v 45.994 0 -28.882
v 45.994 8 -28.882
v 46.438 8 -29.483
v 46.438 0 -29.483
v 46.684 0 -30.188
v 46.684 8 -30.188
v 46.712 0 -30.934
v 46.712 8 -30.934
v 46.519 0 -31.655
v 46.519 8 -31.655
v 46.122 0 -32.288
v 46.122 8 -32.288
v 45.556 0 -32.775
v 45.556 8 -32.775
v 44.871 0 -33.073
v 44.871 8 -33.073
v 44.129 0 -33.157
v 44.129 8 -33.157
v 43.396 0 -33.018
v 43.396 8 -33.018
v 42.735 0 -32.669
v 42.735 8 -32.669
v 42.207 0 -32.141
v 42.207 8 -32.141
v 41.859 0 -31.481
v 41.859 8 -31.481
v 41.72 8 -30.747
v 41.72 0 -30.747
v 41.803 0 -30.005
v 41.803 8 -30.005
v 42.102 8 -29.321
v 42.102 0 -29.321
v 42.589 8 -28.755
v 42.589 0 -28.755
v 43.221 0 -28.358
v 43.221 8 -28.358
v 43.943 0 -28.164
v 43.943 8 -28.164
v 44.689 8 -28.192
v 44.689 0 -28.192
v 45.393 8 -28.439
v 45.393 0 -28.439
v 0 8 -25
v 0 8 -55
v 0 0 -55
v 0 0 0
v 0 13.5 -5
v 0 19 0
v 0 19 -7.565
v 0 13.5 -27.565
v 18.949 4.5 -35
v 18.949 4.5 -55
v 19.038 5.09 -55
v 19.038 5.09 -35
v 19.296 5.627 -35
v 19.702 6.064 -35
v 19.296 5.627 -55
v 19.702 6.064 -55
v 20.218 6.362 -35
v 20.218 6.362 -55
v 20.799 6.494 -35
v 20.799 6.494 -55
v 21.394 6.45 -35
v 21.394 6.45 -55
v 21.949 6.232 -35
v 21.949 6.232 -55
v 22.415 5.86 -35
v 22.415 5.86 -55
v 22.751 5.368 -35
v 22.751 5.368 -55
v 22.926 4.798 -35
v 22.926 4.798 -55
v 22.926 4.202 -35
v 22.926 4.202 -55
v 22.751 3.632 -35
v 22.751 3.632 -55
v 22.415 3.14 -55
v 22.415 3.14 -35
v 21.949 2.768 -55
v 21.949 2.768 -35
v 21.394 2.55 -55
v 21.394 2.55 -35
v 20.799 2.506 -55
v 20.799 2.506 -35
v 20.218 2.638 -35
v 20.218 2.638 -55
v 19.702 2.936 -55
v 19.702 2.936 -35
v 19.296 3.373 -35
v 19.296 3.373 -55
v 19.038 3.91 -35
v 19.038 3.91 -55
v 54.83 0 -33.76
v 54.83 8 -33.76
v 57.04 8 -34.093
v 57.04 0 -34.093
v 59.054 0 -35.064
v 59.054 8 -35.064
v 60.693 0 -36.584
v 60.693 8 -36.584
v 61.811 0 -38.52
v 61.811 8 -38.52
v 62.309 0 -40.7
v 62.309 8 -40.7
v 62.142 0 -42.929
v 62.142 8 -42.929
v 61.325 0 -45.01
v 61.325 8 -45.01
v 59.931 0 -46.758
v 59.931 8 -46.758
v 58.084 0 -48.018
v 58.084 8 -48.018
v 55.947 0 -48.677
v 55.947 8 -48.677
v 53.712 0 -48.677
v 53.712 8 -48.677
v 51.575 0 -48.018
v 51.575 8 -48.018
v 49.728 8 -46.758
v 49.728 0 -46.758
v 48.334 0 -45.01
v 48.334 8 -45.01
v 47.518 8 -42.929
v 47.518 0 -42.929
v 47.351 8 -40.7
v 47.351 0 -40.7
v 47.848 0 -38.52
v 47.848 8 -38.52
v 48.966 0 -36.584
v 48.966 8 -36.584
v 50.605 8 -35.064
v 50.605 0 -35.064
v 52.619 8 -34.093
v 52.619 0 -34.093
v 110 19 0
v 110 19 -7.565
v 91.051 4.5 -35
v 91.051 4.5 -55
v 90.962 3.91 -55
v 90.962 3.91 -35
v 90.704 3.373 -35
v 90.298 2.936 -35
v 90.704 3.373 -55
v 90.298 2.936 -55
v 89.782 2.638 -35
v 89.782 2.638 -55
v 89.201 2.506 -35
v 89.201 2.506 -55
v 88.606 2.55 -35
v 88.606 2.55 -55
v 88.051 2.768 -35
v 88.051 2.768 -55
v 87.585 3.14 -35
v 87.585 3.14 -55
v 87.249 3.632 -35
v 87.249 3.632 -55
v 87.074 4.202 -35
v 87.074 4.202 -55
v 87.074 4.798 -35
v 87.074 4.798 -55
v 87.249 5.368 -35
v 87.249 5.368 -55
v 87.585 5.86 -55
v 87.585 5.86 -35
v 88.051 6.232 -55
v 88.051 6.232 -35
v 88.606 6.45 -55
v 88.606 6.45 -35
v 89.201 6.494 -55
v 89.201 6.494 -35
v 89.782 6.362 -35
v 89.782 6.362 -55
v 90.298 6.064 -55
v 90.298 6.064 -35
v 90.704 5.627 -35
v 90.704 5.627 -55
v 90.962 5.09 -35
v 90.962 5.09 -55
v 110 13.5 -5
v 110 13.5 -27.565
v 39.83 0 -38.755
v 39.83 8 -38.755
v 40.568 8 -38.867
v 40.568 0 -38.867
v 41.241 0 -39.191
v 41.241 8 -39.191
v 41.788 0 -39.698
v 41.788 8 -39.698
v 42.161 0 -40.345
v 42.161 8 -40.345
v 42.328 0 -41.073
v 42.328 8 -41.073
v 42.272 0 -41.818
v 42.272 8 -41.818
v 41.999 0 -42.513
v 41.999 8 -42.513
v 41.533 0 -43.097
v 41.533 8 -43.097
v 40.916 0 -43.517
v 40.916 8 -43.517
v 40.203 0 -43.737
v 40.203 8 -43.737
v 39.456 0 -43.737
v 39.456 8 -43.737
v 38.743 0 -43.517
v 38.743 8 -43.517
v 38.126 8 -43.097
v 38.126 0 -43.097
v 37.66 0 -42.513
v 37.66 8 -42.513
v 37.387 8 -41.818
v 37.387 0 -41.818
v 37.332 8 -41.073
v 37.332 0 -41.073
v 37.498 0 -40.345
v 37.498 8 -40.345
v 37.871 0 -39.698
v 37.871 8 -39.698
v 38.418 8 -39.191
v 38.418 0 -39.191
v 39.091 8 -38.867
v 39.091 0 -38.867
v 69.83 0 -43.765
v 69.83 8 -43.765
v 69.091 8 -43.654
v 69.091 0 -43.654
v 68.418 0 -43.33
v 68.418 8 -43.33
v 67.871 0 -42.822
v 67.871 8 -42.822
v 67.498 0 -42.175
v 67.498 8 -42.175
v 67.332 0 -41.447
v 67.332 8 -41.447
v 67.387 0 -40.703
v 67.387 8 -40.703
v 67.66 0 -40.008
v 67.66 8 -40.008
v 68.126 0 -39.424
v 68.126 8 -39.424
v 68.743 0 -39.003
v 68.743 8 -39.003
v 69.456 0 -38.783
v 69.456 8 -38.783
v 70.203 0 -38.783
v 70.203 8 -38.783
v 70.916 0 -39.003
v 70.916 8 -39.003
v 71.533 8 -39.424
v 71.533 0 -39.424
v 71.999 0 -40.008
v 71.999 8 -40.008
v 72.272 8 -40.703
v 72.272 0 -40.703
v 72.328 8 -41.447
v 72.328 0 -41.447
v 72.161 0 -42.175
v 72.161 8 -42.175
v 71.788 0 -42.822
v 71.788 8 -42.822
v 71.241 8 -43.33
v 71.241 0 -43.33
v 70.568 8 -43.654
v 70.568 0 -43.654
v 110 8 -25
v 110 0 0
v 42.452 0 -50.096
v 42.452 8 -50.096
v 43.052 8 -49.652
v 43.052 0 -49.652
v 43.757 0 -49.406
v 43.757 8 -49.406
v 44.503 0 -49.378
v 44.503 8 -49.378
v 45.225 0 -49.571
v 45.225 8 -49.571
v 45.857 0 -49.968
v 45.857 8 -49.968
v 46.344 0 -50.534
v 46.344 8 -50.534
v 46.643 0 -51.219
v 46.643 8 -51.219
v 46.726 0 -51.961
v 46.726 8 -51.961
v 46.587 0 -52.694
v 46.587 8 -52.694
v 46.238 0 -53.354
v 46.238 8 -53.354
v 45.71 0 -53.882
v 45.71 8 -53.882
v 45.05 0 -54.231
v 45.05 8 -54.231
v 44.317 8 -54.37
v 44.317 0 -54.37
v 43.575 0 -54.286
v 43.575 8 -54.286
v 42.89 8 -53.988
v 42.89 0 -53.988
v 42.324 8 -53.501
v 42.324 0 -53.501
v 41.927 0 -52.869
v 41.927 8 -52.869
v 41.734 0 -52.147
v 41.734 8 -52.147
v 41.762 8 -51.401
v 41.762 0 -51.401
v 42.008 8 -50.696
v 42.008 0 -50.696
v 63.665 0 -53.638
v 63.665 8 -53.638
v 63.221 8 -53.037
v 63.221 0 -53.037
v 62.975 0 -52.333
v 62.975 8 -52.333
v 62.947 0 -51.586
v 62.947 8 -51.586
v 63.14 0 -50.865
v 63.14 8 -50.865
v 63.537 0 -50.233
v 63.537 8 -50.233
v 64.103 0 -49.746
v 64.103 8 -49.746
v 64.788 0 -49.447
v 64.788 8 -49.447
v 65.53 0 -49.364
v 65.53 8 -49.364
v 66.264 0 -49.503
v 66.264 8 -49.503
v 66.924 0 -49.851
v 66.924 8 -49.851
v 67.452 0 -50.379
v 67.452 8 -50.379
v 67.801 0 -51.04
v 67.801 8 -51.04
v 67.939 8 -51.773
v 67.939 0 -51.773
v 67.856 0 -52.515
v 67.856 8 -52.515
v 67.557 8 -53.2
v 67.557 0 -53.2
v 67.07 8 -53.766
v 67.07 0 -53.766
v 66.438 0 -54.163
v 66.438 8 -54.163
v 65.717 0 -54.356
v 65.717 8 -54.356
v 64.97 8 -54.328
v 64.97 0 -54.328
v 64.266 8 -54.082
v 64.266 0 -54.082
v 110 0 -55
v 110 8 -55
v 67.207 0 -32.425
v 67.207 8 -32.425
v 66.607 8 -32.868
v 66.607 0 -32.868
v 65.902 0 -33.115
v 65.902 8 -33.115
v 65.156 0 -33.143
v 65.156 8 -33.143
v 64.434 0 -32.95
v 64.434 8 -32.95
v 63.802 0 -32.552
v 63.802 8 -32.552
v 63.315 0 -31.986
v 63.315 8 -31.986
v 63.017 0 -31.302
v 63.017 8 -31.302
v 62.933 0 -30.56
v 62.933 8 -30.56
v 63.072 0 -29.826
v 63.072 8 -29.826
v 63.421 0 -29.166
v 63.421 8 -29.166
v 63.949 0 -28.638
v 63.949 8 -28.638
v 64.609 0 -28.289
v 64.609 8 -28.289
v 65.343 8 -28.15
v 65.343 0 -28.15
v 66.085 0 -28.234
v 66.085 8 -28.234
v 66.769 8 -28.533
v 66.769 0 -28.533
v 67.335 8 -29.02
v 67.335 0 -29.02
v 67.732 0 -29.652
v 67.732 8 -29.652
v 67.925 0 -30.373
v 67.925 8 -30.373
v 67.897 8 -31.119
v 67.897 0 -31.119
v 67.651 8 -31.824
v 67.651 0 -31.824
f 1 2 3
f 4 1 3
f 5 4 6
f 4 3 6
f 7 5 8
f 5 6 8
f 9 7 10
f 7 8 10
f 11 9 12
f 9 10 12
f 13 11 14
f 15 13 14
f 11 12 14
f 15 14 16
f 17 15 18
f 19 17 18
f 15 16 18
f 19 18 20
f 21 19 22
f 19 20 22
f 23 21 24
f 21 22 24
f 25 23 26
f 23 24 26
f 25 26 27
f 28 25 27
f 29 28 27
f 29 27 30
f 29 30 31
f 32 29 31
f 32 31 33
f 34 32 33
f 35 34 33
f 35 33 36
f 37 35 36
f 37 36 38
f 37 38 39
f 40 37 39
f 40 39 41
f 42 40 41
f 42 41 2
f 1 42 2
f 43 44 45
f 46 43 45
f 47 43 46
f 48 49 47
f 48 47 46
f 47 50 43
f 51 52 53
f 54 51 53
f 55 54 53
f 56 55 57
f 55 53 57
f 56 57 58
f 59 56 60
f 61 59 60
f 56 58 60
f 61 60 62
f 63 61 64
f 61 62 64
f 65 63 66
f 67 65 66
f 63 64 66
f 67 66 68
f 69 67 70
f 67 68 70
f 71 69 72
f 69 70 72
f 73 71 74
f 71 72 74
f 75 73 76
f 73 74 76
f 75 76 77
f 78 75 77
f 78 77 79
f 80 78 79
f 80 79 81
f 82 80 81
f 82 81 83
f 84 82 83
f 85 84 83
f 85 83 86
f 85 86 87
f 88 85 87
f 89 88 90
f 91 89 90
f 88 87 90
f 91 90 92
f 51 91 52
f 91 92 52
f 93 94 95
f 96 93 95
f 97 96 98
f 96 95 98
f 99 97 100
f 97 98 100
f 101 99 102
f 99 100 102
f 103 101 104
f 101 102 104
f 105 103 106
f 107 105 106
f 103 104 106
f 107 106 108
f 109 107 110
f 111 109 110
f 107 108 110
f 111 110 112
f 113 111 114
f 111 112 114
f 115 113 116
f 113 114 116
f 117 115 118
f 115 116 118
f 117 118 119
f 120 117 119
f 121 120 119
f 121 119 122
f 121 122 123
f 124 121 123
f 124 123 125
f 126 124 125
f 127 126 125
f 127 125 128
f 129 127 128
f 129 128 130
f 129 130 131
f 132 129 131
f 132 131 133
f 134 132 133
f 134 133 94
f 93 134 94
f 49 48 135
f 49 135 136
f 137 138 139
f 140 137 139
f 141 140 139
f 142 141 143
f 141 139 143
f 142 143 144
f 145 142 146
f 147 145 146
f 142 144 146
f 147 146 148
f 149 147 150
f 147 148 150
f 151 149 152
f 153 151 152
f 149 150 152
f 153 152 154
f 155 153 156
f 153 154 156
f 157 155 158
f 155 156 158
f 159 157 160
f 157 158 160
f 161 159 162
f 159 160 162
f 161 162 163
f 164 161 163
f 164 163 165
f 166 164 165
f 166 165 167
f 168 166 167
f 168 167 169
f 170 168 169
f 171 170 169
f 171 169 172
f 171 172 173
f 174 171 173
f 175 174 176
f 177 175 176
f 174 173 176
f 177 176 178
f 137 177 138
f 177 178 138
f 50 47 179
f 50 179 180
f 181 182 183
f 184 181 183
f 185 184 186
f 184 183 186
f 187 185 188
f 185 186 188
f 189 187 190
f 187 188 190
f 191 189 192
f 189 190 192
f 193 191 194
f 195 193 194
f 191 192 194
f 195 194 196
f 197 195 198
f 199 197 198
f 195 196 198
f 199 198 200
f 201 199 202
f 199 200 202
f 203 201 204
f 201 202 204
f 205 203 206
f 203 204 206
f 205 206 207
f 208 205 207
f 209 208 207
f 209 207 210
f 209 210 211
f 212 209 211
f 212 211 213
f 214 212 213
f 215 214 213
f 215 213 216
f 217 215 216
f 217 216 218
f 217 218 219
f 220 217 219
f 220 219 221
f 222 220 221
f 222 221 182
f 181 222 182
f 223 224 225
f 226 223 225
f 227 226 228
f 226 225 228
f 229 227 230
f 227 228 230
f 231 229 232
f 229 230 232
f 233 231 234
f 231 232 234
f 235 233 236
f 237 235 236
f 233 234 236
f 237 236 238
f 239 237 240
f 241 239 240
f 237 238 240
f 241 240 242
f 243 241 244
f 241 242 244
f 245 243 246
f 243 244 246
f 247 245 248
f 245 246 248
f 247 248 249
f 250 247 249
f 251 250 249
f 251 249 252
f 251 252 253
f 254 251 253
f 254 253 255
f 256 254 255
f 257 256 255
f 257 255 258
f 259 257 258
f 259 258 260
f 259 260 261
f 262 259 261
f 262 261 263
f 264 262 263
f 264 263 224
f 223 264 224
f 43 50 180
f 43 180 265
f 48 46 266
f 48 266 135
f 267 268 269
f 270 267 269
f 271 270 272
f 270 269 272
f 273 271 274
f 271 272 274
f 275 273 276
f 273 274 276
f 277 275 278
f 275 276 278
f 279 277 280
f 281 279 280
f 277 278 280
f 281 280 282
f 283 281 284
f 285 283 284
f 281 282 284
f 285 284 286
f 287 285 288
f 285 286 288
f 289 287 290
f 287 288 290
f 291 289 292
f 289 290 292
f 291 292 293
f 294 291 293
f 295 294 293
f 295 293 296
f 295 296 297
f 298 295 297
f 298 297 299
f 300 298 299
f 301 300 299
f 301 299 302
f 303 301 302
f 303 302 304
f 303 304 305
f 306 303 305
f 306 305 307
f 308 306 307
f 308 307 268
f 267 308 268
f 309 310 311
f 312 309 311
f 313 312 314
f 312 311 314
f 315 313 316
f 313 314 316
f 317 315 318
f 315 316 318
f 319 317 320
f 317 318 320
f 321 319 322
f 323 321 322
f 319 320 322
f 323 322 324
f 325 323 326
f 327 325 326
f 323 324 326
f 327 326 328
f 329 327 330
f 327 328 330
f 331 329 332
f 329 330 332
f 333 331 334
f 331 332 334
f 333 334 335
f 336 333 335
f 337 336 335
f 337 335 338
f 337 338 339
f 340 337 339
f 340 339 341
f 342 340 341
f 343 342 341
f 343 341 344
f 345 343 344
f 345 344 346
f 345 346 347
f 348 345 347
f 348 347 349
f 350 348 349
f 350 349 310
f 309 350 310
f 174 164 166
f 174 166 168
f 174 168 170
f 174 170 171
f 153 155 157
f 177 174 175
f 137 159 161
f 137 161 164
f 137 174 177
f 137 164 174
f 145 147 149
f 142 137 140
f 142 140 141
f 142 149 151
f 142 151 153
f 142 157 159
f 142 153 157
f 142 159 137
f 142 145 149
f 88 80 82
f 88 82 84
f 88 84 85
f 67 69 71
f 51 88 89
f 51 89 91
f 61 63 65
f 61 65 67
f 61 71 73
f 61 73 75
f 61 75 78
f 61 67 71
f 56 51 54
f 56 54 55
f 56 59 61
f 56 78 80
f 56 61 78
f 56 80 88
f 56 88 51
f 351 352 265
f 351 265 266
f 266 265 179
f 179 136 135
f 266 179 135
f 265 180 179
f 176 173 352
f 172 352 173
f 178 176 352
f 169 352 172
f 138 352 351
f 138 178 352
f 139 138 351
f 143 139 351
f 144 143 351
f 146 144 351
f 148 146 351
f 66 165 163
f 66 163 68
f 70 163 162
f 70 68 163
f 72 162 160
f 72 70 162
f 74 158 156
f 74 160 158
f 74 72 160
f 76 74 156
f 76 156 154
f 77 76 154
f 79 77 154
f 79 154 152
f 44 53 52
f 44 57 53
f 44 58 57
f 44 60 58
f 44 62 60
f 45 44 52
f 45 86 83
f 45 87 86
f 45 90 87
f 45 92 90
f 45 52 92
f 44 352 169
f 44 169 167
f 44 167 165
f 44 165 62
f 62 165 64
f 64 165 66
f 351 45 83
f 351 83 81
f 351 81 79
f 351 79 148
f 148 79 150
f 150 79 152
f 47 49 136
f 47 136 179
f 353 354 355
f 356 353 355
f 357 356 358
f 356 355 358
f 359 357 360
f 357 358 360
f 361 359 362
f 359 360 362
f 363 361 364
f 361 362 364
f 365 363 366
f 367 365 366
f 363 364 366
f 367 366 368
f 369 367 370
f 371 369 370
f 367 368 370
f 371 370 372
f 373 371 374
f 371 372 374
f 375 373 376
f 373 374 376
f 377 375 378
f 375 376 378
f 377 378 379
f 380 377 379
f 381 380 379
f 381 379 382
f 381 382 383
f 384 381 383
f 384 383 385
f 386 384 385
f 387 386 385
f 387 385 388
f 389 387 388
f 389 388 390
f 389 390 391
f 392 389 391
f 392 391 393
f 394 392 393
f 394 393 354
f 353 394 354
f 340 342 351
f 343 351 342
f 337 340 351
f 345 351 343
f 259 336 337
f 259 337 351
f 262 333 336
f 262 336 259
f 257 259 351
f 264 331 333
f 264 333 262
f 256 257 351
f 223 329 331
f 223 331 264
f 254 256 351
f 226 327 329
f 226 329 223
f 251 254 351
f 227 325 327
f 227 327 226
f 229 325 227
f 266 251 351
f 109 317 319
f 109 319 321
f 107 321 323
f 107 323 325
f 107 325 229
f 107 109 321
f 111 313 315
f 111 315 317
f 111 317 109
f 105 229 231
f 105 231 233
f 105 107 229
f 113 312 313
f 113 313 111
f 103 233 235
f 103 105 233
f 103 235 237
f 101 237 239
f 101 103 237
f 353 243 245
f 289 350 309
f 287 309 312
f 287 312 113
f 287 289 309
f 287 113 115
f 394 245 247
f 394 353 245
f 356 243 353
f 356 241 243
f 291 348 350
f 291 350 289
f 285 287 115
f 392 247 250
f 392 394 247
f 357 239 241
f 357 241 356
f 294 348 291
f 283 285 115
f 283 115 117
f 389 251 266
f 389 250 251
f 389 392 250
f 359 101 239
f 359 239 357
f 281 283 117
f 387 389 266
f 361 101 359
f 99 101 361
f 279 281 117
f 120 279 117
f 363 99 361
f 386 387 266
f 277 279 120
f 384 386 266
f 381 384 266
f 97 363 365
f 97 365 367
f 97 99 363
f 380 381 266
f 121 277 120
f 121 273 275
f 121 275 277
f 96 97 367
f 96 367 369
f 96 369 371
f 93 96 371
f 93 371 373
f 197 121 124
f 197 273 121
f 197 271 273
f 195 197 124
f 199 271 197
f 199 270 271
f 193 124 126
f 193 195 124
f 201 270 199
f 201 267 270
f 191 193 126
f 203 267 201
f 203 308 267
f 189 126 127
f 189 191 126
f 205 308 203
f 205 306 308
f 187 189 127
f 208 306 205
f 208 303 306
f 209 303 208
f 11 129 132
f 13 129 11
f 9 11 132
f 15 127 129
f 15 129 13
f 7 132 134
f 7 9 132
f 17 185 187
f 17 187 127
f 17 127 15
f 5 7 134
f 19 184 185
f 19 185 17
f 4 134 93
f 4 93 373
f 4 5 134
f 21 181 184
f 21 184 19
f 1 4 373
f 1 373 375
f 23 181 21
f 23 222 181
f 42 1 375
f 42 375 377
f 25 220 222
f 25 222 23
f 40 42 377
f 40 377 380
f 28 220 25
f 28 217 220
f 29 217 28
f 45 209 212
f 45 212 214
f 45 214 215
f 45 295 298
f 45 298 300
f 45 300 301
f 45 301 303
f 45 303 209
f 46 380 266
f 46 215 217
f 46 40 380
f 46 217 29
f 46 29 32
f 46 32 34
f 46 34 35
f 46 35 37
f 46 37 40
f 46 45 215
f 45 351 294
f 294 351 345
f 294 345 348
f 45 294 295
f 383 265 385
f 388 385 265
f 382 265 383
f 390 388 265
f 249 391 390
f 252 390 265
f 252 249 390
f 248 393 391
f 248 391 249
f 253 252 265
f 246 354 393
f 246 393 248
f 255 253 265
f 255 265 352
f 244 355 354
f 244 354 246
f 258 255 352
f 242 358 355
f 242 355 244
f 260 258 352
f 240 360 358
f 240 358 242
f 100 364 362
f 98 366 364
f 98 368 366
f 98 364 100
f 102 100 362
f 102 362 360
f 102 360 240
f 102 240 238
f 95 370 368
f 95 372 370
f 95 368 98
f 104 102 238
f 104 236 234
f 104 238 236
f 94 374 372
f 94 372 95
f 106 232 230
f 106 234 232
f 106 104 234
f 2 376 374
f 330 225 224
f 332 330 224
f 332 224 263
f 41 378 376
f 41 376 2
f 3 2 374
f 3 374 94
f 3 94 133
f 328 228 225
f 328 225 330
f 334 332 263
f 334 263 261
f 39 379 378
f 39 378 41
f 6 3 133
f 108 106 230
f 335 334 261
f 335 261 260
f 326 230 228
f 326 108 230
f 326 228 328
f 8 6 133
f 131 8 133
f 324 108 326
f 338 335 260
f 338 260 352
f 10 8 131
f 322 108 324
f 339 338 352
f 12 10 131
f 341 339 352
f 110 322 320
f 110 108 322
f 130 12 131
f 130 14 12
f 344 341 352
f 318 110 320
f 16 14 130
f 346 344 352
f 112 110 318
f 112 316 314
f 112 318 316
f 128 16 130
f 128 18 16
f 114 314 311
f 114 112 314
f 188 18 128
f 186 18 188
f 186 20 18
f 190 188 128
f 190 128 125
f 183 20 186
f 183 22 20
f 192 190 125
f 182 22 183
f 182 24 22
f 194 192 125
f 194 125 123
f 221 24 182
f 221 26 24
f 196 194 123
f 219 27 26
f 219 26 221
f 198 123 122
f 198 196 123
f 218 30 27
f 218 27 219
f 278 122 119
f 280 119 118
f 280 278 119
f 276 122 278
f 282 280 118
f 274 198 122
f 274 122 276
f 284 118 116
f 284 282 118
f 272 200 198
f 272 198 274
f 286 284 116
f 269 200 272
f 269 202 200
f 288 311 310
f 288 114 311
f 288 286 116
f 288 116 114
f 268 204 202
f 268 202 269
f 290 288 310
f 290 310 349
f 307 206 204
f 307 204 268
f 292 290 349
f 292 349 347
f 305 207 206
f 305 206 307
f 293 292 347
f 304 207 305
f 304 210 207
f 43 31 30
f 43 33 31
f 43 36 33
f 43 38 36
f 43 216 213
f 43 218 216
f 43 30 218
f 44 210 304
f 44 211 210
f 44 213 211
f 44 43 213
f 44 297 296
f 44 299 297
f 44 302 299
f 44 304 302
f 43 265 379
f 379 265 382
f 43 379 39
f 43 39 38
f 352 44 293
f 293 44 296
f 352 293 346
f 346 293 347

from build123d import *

# Parameters (mm, degrees)
BOSS_EXTRUDE1_DEPTH = 110
SKETCH2_R           = 2
M_DRILL_DEPTH       = 20
SKETCH6_R           = 7.5
CUT_EXTRUDE2_DEPTH  = 10
SKETCH8_R           = 2.504958384
CUT_EXTRUDE3_DEPTH  = 10
CIRPATTERN1_COUNT   = 8


with BuildPart() as part:
    # Sketch1 → Boss-Extrude1 (new body)
    with BuildSketch(Plane(origin=(0, 0, 0), x_dir=(0, 0, -1), z_dir=(1, 0, 0))):
        Polygon((0, 0), (0, 19), (7.56469212, 19), (5, 13.5), (27.56469212, 13.5), (25, 8), (55, 8), (55, 0), align=None)
    extrude(amount=BOSS_EXTRUDE1_DEPTH)

    # Sketch2 → M$_DRILL (cut)
    with BuildSketch(Plane(origin=(0, 0, -55), x_dir=(-1, 0, 0), z_dir=(0, 0, -1))):
        with Locations((-20.948830341, 4.5)):
            Circle(SKETCH2_R)
        with Locations(Location((-89.051169659, 4.5, 0), (0, 0, 180))):
            Circle(SKETCH2_R)
    extrude(amount=-M_DRILL_DEPTH, mode=Mode.SUBTRACT)

    # Sketch6 → Cut-Extrude2 (cut)
    with BuildSketch(Plane(origin=(0, 8, 0), x_dir=(1, 0, 0), z_dir=(0, 1, 0))):
        with Locations(Location((54.829568948, 41.26029258, 0), (0, 0, 270))):
            Circle(SKETCH6_R)
    extrude(amount=-CUT_EXTRUDE2_DEPTH, mode=Mode.SUBTRACT)

    # Sketch8 → Cut-Extrude3 (cut)
    with BuildSketch(Plane(origin=(0, 8, 0), x_dir=(1, 0, 0), z_dir=(0, 1, 0))):
        with Locations(Location((39.829568948, 41.26029258, 0), (0, 0, 270))):
            Circle(SKETCH8_R)
    cut_extrude3 = extrude(amount=-CUT_EXTRUDE3_DEPTH, mode=Mode.SUBTRACT)

    # CirPattern1: Cut-Extrude3 ×8 about axis, 2 skipped
    cirpattern1_axis = Axis((54.829568948, 0, -41.26029258), (0, 1, 0))
    add([cut_extrude3.rotate(cirpattern1_axis, i * 360 / CIRPATTERN1_COUNT) for i in range(1, CIRPATTERN1_COUNT) if i not in (2, 6)], mode=Mode.SUBTRACT)


solid = part.part
